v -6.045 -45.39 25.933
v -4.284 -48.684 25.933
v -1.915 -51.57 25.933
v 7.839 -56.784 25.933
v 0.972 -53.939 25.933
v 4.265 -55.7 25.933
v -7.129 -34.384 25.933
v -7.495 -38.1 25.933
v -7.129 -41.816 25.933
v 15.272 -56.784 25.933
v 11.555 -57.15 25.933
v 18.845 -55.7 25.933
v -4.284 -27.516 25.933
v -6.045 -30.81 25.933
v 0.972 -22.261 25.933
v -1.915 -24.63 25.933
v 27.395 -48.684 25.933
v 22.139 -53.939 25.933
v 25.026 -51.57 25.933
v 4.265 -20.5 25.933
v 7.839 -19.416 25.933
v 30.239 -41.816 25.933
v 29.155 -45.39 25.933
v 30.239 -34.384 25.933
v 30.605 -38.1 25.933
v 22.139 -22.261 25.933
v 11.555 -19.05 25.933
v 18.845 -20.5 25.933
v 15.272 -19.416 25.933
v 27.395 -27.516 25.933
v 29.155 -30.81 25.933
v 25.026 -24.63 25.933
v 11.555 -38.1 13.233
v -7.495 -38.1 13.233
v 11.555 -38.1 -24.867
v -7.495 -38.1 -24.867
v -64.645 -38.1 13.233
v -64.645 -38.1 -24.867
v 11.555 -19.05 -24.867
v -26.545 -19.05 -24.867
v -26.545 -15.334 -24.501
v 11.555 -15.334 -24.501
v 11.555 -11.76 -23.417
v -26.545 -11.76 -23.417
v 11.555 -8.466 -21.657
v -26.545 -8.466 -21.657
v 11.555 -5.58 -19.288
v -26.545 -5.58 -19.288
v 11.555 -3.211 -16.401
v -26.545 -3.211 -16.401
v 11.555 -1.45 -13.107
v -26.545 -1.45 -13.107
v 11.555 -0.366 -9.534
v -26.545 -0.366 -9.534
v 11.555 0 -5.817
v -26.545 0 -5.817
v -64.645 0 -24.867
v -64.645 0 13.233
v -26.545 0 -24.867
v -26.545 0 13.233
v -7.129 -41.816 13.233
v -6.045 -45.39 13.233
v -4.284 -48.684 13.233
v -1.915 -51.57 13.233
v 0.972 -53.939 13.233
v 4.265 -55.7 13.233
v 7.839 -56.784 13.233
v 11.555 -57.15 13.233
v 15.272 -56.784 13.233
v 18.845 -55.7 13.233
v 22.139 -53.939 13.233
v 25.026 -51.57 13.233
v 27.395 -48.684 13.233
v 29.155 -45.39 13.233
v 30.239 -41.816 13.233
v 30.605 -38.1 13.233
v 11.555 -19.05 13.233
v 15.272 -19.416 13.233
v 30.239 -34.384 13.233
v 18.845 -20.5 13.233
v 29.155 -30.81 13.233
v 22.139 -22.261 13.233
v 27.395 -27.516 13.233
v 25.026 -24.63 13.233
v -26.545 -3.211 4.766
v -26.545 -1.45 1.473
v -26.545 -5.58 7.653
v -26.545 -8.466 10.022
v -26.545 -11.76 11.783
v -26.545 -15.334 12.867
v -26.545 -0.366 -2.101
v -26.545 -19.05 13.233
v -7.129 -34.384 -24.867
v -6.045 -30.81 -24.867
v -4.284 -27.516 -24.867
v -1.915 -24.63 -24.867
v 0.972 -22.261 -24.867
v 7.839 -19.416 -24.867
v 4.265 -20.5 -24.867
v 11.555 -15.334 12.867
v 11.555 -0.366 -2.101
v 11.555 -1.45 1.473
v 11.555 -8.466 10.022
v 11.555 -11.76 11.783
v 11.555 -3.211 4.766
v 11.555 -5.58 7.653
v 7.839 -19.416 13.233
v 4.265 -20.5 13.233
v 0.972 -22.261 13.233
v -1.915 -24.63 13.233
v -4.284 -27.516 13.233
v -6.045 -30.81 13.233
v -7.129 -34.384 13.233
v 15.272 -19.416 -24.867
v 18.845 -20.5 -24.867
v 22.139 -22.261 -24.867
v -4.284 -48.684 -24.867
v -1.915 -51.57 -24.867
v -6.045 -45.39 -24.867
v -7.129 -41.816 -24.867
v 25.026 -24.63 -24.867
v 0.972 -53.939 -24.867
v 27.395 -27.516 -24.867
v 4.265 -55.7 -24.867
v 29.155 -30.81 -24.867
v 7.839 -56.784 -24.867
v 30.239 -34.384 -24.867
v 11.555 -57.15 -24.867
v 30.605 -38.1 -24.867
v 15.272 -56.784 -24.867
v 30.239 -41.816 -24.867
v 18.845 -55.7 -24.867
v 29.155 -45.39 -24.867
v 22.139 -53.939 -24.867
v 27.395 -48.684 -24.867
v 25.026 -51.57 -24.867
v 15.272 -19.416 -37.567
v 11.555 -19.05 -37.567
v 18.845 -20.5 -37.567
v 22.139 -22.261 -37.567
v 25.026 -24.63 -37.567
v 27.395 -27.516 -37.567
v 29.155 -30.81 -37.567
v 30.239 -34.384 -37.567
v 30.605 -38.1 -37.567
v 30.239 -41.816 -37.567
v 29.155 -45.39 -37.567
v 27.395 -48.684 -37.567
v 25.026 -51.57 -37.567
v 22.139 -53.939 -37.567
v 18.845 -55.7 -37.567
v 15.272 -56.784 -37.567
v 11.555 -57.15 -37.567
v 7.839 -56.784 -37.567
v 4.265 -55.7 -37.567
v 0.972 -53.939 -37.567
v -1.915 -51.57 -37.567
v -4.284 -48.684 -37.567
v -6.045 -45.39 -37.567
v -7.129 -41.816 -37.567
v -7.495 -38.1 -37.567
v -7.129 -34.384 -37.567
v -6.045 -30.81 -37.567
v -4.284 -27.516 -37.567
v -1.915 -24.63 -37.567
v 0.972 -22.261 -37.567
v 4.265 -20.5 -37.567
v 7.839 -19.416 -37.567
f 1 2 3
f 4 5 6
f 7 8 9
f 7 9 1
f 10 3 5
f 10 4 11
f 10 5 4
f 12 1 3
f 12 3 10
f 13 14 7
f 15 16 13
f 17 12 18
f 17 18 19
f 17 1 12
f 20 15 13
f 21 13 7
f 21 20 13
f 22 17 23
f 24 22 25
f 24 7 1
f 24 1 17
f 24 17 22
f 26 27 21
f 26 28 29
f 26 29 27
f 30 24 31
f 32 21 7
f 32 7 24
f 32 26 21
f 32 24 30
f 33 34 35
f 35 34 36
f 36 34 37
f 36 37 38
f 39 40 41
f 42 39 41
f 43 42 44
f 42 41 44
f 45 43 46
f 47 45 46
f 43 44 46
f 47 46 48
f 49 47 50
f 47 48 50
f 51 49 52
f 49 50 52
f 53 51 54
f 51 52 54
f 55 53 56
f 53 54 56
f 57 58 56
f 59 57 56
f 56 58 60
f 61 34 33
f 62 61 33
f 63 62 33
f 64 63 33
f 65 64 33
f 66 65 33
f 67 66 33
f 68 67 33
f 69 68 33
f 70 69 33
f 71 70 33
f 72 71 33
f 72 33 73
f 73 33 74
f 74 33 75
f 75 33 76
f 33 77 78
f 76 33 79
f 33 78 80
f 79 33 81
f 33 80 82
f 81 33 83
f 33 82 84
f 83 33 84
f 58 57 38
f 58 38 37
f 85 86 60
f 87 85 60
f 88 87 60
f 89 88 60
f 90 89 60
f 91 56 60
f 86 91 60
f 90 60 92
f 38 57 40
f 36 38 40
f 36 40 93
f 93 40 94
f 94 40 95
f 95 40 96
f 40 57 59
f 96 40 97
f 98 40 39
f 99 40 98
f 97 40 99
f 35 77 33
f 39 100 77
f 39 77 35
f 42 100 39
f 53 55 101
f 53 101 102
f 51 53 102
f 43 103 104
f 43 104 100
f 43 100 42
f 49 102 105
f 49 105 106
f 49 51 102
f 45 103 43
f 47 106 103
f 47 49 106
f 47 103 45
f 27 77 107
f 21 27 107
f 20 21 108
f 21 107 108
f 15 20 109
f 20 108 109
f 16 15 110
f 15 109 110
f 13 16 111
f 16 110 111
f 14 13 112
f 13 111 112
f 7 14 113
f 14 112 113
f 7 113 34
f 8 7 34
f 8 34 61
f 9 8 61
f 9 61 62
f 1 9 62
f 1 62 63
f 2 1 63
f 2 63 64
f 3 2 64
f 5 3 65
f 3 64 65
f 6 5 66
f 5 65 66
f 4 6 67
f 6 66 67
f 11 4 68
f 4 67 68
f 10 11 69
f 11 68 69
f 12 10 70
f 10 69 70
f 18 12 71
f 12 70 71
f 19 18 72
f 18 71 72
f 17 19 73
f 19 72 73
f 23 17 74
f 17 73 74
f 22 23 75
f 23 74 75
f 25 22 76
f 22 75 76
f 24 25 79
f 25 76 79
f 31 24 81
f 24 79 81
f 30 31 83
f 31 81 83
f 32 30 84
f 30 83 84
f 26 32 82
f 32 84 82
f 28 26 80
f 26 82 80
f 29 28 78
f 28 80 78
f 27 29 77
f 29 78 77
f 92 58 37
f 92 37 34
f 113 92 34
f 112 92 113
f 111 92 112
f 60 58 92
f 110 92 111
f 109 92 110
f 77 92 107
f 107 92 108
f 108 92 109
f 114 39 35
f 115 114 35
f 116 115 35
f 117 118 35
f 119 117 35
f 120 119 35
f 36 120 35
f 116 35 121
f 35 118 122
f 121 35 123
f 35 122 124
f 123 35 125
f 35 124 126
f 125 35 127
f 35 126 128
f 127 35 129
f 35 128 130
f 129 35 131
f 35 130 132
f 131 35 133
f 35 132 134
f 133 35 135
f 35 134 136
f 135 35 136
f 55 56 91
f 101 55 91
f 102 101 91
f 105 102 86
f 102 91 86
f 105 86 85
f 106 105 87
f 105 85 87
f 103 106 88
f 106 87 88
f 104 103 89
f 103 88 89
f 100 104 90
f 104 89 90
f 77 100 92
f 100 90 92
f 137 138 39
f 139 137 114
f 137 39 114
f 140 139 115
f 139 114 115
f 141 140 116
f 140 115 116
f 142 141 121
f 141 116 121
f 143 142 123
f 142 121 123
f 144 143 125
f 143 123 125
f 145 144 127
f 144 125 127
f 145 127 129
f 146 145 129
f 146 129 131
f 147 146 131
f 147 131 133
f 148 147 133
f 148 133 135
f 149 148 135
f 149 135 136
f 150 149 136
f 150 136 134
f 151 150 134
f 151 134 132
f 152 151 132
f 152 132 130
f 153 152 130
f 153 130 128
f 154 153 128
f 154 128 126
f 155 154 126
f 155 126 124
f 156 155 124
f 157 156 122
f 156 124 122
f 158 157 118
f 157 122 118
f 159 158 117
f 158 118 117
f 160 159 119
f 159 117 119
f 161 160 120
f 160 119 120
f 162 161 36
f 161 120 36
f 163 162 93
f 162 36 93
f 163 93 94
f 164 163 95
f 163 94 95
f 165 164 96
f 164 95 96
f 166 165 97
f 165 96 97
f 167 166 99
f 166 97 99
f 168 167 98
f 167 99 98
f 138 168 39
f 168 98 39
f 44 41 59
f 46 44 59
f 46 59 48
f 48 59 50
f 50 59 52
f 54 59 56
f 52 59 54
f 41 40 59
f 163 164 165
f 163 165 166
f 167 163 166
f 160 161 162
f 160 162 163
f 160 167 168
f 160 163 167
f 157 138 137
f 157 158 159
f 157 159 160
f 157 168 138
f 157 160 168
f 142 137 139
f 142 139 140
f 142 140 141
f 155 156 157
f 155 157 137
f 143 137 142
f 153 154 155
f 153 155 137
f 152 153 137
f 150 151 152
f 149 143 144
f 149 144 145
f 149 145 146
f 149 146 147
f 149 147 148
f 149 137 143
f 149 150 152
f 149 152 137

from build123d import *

# Parameters (mm, degrees)
F0_W     = 38.1
F0_H     = 38.1
F1_DEPTH = 38.1
F3_DEPTH = 38.1
F4_DEPTH = 19.05
F7_DEPTH = 12.7
F8_DEPTH = 12.7


# Not quite as in the source:
# - a feature of the source that left no trace in its solid (it failed there, or was rolled back) is left out


with BuildPart() as f1:
    # F0 (on Front) → F1 (new body)
    with BuildSketch(Plane.XZ):
        with Locations((-45.594806087, -5.8171211302)):
            Rectangle(F0_W, F0_H)
    extrude(amount=F1_DEPTH)

    # F2 (on face) → F3 (join)
    with BuildSketch(Plane.YZ.offset(-26.544806087)):
        with BuildLine():
            Line((-19.05, 13.2328788698), (-19.05, -24.8671211302))
            ThreePointArc((-19.05, -24.8671211302), (-5.5796158184, -19.2875053118), (0, -5.8171211302))
            ThreePointArc((0, -5.8171211302), (-5.5796158184, 7.6532630514), (-19.05, 13.2328788698))
        make_face()
    extrude(amount=F3_DEPTH)

    # F4 (add): a face of the model
    f4_faces = [f1.faces().sort_by_distance(p)[0] for p in [
        (-7.494806087, -19.05, -5.8171211302),
    ]]
    extrude(f4_faces, amount=F4_DEPTH)

    # F6 (on face) → F7 (join)
    with BuildSketch(Plane.XY.offset(13.2328788698)):
        with BuildLine():
            ThreePointArc((-7.494806087, -38.1), (11.555193913, -57.15), (30.605193913, -38.1))
            ThreePointArc((30.605193913, -38.1), (25.0255780946, -24.6296158184), (11.555193913, -19.05))
            Line((11.555193913, -19.05), (11.555193913, -38.1))
            Line((11.555193913, -38.1), (-7.494806087, -38.1))
        make_face()
        with BuildLine():
            Line((11.555193913, -38.1), (11.555193913, -19.05))
            ThreePointArc((11.555193913, -19.05), (-1.9151902686, -24.6296158184), (-7.494806087, -38.1))
            Line((-7.494806087, -38.1), (11.555193913, -38.1))
        make_face()
    extrude(amount=F7_DEPTH)

    # F5 (on face) → F8 (join)
    with BuildSketch(Plane(origin=(0, 0, -24.8671211302), x_dir=(1, 0, 0), z_dir=(0, 0, -1))):
        with BuildLine():
            Line((11.555193913, 38.1), (11.555193913, 19.05))
            ThreePointArc((11.555193913, 19.05), (25.0255780946, 24.6296158184), (30.605193913, 38.1))
            ThreePointArc((30.605193913, 38.1), (11.555193913, 57.15), (-7.494806087, 38.1))
            Line((-7.494806087, 38.1), (11.555193913, 38.1))
        make_face()
        with BuildLine():
            ThreePointArc((-7.494806087, 38.1), (-1.9151902686, 24.6296158184), (11.555193913, 19.05))
            Line((11.555193913, 19.05), (11.555193913, 38.1))
            Line((11.555193913, 38.1), (-7.494806087, 38.1))
        make_face()
    extrude(amount=F8_DEPTH)


solid = f1.part
